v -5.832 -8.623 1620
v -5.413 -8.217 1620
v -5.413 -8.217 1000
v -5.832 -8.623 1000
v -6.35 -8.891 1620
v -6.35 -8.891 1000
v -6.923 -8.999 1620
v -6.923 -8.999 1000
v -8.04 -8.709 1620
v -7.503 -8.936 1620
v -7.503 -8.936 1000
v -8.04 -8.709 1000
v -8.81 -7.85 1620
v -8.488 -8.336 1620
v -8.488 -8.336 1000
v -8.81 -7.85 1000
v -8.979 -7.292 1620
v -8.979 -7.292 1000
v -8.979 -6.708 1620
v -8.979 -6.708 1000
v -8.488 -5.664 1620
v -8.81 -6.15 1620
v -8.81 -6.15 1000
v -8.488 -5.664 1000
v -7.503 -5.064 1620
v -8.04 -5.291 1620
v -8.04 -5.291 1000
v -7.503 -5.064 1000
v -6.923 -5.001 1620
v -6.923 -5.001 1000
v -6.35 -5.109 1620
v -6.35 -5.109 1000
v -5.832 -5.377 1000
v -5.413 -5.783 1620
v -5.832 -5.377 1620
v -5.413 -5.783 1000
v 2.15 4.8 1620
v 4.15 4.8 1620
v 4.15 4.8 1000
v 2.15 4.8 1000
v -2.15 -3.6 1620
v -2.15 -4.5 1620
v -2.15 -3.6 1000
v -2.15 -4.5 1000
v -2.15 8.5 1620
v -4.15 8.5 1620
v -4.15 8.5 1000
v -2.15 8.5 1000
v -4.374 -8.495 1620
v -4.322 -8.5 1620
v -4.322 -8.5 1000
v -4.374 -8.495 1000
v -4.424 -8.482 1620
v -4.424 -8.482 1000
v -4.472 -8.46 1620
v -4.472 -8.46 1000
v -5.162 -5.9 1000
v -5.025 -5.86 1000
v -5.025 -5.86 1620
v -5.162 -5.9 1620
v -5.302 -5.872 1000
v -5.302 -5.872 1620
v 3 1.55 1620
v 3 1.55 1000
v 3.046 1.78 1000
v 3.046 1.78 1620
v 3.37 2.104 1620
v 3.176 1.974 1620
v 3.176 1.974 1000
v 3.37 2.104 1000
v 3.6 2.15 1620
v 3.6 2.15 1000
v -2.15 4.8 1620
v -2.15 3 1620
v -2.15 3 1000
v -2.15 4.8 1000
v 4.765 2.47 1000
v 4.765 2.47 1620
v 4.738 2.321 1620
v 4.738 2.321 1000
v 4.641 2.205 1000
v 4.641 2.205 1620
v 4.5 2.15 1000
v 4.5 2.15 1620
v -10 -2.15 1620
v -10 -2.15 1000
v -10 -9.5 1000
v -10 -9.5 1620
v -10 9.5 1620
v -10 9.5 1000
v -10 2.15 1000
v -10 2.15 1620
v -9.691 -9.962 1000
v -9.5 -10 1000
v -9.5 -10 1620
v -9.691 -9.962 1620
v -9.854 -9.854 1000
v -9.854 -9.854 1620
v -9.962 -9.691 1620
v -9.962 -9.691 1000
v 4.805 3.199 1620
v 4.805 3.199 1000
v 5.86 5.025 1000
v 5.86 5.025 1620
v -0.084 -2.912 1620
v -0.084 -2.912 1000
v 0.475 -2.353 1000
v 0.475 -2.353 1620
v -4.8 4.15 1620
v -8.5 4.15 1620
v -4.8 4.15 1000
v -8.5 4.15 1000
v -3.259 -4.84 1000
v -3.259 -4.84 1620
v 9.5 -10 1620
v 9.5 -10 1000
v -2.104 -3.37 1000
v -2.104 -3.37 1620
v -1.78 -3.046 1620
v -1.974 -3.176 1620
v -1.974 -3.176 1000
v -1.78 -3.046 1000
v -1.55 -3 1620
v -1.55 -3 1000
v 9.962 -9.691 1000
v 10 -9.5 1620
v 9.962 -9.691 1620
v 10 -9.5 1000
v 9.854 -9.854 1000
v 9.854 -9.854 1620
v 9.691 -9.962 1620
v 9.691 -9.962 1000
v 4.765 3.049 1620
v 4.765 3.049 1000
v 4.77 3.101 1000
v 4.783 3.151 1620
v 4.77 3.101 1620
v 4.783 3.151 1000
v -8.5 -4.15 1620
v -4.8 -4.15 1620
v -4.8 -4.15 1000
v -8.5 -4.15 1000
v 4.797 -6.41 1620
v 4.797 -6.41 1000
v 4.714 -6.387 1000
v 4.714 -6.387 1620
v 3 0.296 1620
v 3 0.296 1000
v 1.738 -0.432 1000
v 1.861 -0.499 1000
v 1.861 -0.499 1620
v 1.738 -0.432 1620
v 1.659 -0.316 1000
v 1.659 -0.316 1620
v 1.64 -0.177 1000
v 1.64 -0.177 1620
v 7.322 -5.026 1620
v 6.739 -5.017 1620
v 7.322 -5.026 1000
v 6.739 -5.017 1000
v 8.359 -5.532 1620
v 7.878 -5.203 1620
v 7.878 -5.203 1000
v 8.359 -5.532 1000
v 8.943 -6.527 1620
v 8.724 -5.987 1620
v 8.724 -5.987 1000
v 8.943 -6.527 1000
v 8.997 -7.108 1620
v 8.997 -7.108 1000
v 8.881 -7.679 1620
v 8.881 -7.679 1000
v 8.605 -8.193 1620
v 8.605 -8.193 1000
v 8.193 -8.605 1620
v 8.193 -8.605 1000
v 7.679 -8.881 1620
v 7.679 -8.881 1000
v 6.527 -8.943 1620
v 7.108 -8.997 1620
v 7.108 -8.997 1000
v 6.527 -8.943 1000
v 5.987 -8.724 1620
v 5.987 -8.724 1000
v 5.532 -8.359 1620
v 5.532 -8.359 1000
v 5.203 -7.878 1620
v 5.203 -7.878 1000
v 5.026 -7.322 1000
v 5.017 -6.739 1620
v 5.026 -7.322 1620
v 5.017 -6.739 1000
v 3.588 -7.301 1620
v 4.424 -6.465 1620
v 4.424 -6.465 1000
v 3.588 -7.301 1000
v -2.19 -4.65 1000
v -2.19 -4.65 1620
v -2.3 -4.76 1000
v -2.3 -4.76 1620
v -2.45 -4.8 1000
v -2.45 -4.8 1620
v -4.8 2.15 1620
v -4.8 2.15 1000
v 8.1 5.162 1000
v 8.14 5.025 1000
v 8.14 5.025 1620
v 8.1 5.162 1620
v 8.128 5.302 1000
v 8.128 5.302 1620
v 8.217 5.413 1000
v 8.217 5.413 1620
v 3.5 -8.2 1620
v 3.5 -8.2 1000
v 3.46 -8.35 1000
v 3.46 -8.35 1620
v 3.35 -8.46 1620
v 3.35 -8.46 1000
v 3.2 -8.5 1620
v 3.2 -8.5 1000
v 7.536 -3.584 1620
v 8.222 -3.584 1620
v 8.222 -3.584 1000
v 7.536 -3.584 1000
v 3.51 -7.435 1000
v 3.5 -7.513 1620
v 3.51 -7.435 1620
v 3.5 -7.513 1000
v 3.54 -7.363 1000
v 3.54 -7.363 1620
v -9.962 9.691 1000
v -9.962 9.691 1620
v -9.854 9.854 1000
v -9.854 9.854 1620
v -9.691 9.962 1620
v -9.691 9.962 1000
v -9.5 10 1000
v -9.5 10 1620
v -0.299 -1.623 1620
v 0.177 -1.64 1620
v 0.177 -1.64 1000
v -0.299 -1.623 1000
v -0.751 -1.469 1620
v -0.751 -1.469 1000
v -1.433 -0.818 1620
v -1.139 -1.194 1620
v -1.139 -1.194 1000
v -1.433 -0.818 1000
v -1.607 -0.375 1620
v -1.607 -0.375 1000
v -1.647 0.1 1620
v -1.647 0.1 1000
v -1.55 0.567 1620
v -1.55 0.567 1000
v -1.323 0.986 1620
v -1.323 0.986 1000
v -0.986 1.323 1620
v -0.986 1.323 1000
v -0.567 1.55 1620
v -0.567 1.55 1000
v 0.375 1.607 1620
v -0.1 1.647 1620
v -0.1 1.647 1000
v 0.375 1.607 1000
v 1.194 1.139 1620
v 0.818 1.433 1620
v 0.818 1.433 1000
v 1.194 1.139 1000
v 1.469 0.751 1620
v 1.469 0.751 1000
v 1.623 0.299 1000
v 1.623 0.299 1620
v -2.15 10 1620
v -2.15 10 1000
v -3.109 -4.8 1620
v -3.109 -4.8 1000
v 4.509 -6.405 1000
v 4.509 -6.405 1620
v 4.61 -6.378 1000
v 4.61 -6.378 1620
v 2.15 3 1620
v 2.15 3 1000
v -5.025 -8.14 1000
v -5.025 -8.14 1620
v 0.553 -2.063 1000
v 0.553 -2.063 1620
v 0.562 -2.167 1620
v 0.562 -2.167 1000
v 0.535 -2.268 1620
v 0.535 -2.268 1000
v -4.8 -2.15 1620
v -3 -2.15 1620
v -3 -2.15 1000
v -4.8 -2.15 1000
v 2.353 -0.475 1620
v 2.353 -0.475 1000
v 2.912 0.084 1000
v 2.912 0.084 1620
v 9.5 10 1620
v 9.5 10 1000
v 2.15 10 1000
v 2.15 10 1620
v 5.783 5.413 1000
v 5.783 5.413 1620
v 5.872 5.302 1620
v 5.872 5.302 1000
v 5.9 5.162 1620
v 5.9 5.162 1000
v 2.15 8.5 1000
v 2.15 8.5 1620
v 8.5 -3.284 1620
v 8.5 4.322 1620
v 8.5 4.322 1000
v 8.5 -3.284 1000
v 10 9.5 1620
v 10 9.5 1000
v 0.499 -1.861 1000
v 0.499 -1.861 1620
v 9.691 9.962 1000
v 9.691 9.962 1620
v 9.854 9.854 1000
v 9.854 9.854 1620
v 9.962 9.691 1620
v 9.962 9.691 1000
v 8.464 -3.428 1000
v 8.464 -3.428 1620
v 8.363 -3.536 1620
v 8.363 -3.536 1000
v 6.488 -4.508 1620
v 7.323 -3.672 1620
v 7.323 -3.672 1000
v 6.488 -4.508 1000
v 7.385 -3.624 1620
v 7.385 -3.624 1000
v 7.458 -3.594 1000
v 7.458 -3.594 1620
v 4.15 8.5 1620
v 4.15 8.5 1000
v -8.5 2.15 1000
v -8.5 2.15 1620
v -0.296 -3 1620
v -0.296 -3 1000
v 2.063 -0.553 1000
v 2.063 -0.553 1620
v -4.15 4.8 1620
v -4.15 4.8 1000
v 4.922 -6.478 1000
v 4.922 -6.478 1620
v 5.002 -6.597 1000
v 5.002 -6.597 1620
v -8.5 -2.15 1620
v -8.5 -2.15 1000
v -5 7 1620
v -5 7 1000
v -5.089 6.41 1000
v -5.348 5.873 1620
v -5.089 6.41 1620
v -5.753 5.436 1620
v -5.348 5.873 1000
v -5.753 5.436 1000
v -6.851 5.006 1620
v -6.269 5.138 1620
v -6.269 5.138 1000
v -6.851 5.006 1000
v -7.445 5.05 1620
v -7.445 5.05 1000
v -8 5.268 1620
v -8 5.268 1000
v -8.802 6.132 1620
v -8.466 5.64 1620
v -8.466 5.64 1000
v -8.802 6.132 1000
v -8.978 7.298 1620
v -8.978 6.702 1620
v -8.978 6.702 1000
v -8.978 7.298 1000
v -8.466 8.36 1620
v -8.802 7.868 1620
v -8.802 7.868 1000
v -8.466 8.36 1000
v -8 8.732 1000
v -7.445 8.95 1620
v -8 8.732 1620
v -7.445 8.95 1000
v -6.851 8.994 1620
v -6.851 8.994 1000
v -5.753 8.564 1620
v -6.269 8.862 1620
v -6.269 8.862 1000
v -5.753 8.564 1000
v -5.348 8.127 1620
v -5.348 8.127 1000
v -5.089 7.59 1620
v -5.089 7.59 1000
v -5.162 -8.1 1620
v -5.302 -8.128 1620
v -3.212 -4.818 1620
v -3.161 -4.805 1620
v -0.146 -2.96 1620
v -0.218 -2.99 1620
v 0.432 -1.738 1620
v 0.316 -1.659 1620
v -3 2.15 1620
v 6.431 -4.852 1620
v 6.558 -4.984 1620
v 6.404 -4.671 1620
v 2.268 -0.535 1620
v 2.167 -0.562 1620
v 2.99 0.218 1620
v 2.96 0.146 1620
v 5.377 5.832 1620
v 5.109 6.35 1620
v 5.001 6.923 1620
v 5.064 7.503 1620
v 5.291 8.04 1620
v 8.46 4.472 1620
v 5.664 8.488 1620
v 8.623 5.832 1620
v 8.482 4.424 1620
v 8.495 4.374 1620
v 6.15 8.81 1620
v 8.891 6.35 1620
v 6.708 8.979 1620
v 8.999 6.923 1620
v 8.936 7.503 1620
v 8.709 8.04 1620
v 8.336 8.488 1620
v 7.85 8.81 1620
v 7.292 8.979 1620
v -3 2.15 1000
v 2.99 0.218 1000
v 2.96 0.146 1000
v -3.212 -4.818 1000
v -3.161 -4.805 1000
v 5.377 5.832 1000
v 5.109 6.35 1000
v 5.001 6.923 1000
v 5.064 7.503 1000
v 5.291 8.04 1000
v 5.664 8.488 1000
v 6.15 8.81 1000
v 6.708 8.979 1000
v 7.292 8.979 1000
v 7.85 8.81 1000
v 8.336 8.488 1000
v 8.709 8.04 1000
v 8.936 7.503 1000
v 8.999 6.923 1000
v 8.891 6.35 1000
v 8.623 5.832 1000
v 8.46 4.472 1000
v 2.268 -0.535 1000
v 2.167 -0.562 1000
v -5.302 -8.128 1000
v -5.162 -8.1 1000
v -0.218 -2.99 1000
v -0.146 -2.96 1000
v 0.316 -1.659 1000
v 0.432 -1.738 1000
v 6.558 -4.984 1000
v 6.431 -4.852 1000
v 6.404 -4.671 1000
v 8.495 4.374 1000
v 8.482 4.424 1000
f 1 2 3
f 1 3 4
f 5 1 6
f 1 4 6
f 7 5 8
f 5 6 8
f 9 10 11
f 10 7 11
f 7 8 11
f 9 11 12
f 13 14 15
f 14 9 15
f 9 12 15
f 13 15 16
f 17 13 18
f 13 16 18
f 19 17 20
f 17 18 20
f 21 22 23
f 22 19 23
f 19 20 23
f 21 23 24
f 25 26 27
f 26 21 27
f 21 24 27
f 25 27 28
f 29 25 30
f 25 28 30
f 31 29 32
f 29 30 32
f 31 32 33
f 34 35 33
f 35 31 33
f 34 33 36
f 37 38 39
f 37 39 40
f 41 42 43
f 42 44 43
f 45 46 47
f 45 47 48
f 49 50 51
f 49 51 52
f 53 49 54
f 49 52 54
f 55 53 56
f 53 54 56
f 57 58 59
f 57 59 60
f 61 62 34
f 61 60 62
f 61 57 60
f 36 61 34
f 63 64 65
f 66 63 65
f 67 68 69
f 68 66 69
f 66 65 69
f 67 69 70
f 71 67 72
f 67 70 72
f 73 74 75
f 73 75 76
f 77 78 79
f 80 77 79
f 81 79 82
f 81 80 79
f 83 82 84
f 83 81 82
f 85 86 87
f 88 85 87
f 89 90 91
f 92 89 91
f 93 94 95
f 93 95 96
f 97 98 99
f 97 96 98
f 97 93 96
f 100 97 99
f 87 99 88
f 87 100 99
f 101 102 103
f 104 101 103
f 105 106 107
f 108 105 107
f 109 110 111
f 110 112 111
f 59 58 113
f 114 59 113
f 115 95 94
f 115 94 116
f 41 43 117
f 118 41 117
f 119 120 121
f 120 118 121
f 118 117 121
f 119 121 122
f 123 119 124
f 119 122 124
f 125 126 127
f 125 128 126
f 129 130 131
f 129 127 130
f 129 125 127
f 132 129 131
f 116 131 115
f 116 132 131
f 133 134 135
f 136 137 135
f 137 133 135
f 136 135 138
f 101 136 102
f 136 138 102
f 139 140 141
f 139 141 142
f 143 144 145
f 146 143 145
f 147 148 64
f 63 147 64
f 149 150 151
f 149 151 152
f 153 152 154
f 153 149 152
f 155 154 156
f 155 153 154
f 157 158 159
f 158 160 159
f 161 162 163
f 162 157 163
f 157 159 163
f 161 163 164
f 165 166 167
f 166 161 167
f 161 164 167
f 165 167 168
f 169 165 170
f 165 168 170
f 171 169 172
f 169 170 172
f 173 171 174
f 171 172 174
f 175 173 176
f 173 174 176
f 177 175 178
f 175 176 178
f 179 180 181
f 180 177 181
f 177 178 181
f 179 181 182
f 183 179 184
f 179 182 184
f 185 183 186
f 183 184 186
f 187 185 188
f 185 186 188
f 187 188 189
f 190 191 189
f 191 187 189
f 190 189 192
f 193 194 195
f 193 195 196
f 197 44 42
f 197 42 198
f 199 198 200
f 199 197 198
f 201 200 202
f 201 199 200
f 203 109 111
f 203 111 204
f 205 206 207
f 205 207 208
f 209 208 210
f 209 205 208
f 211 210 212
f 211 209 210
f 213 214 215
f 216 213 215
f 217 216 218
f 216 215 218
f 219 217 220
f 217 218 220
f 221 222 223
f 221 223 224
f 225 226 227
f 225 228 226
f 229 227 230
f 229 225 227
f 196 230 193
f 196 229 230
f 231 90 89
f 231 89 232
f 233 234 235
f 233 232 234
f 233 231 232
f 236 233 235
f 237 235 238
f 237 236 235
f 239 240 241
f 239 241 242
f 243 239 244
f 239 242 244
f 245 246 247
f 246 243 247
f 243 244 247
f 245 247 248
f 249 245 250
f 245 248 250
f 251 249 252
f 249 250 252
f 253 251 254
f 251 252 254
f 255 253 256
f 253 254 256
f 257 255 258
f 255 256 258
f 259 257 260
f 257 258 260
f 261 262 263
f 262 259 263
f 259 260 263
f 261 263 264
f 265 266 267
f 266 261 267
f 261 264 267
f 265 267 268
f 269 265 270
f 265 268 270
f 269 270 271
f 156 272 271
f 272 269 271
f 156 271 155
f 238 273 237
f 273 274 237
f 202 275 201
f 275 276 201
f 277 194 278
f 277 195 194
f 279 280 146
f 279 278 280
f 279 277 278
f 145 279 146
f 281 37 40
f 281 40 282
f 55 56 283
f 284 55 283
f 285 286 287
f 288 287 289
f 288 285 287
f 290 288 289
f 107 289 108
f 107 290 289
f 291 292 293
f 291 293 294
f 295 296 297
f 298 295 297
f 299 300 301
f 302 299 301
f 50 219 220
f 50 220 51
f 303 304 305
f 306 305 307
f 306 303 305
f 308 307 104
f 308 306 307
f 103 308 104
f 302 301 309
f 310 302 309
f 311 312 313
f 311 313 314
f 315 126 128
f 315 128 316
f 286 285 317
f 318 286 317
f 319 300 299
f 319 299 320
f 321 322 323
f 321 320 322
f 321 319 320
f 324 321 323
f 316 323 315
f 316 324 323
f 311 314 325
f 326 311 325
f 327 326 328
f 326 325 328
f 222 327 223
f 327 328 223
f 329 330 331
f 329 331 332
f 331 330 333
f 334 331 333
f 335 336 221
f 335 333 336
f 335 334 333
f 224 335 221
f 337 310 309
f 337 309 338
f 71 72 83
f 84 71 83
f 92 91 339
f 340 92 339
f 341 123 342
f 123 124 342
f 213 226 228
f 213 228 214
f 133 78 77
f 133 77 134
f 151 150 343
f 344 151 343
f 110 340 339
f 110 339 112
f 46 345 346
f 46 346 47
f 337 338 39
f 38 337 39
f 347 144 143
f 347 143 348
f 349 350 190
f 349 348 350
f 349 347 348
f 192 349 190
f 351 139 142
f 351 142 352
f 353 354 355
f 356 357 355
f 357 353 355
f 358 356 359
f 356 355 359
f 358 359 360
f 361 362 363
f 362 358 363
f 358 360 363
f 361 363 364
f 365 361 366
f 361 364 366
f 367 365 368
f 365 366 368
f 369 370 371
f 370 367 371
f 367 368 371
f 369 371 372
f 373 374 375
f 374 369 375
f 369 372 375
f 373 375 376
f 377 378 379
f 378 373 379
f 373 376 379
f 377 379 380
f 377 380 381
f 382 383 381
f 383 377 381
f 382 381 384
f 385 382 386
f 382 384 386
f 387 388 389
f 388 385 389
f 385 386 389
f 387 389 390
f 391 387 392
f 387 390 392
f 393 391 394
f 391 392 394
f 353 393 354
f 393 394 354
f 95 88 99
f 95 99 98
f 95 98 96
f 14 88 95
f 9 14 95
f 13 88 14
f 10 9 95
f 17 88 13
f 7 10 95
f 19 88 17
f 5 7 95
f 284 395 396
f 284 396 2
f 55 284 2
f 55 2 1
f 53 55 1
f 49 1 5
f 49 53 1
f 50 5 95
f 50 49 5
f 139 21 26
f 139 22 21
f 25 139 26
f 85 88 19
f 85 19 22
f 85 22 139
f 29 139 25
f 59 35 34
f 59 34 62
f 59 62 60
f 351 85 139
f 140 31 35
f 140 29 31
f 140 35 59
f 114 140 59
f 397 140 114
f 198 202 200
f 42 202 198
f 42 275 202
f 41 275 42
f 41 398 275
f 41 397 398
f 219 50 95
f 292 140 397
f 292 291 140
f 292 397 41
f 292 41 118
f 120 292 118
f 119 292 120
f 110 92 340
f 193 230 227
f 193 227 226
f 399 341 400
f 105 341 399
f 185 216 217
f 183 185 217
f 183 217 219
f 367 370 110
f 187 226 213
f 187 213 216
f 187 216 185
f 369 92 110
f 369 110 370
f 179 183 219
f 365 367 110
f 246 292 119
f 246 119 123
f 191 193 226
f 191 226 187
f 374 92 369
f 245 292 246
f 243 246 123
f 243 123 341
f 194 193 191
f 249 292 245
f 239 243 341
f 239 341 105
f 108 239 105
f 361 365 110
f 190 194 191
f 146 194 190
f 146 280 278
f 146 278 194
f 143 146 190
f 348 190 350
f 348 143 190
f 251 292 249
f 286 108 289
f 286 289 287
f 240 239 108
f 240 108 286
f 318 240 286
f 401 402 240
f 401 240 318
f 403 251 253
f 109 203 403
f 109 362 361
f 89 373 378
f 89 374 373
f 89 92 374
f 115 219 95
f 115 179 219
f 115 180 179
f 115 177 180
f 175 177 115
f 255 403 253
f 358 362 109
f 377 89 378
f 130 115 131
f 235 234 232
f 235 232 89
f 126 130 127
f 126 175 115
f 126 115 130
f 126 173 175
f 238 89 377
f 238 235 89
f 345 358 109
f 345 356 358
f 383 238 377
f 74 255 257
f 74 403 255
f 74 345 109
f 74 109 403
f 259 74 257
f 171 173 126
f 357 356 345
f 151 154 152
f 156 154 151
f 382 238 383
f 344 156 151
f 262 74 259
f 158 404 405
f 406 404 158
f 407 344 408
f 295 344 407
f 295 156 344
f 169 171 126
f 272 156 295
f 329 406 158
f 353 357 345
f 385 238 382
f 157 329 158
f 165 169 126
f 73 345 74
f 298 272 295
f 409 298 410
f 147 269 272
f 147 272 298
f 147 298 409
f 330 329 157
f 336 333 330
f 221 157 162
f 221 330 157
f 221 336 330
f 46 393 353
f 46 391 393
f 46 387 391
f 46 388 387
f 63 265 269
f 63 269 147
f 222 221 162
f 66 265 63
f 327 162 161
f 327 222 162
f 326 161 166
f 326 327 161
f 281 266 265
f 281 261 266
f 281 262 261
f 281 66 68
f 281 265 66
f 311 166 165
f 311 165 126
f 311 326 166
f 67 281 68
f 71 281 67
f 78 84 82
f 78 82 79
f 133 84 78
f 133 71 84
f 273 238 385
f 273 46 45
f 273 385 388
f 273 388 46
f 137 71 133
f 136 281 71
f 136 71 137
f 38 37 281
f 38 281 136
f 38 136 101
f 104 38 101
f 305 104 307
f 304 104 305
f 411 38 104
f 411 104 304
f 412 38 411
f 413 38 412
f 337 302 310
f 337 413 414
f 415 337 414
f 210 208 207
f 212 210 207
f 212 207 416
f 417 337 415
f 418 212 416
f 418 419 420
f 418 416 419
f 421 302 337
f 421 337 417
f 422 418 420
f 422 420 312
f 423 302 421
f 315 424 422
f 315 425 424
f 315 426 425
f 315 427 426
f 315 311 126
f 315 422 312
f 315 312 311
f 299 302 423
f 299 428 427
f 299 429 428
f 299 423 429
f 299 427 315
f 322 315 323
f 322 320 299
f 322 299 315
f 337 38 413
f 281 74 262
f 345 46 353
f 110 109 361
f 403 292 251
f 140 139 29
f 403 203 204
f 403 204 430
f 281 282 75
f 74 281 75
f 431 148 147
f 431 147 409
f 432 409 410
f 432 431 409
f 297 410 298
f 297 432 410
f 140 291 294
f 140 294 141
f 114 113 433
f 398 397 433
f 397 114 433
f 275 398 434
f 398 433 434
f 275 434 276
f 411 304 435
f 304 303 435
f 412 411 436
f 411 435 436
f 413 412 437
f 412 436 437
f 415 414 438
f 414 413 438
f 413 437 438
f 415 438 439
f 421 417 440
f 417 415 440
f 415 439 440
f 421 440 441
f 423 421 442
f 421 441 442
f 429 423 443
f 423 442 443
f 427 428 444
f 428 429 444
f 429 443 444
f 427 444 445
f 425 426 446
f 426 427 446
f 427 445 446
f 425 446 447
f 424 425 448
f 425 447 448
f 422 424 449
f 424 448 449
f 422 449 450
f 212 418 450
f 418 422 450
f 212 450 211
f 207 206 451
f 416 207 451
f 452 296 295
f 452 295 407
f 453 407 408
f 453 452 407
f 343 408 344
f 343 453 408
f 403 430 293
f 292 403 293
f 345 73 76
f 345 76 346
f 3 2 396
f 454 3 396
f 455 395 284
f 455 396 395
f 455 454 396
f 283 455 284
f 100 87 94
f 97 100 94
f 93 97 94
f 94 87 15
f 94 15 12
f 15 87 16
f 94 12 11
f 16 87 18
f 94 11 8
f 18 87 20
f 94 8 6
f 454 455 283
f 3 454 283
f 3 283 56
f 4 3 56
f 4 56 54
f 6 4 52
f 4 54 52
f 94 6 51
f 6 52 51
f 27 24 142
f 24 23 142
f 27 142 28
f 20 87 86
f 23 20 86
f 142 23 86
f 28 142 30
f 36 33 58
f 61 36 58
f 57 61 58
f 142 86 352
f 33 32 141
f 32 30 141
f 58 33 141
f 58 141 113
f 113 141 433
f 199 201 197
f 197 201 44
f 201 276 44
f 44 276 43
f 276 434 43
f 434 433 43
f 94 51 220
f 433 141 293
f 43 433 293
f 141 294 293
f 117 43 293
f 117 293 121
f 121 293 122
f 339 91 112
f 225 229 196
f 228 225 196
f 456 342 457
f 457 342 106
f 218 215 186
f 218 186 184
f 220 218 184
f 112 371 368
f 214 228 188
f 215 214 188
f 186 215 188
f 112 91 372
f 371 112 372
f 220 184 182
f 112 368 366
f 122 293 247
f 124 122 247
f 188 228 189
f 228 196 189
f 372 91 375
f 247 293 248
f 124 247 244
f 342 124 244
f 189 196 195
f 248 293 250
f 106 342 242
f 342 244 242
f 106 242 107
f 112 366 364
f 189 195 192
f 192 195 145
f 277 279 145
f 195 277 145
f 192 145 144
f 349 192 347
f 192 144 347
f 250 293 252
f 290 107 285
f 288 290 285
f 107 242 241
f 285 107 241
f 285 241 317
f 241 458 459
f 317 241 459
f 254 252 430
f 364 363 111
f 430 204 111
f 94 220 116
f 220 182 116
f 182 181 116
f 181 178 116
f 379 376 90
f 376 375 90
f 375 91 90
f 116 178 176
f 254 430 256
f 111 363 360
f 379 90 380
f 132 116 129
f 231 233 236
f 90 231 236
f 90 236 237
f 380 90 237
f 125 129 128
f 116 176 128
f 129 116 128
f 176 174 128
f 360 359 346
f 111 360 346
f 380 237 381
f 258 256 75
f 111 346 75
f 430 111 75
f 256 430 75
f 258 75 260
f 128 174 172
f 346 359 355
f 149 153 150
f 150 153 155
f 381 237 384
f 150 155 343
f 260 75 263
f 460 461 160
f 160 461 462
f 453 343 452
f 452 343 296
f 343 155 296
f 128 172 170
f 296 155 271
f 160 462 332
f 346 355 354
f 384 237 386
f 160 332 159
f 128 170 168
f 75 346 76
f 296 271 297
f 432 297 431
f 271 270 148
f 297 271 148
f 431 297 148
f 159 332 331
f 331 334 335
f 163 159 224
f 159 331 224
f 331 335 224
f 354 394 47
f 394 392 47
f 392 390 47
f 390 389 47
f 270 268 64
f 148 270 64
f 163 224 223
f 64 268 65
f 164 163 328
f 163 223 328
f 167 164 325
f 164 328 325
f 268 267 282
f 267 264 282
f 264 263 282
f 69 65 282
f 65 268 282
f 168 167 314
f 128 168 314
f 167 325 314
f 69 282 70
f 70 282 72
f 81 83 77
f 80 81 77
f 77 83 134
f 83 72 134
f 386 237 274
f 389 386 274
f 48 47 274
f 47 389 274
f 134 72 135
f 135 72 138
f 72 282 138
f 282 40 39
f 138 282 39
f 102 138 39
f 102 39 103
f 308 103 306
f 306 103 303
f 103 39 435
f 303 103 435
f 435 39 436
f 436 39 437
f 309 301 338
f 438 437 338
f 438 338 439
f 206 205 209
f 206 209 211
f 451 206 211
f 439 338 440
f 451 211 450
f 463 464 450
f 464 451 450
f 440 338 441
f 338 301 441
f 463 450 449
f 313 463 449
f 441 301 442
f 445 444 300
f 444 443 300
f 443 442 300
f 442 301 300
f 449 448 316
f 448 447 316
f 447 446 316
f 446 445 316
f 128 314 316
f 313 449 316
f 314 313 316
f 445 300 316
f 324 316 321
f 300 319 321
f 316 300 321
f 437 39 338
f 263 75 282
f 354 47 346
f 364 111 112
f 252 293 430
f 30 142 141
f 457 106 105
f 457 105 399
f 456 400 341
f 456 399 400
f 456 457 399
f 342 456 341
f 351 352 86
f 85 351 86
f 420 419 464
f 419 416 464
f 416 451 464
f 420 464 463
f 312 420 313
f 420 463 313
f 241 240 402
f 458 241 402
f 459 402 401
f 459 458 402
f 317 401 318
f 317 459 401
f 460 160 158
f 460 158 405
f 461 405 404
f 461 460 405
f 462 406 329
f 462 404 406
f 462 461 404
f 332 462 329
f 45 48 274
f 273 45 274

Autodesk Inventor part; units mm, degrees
ref_plane "YZ Plane" through (0, 0, 0) normal (1, 0, 0) x (0, 1, 0)
ref_plane "XZ Plane" through (0, 0, 0) normal (0, 1, 0) x (-1, 0, 0)
ref_plane "作業平面1" through (-9.5, -10, 1000) normal (0, 0, 1) x (1, 0, 0)
sketch "スケッチ1" plane through (-9.5, -10, 1000) normal (0, 0, 1) x (1, 0, 0)
  line L0 (7.35, 18.5) -> (7.35, 20) projected
  line L1 (7.35, 20) -> (0, 20) projected
  arc A0 (0, 20) -> (-0.5, 19.5) centre (0, 19.5) ccw projected
  line L2 (-0.5, 19.5) -> (-0.5, 12.15) projected
  line L3 (-0.5, 12.15) -> (1, 12.15) projected
  line L4 (1, 12.15) -> (1, 14.15) projected
  line L5 (1, 14.15) -> (4.7, 14.15) projected
  line L6 (4.7, 14.15) -> (4.7, 12.15) projected
  line L7 (4.7, 12.15) -> (6.5, 12.15) projected
  line L8 (6.5, 12.15) -> (6.5, 7.85) projected
  line L9 (6.5, 7.85) -> (4.7, 7.85) projected
  line L10 (4.7, 7.85) -> (4.7, 5.85) projected
  line L11 (4.7, 5.85) -> (1, 5.85) projected
  line L12 (1, 5.85) -> (1, 7.85) projected
  line L13 (1, 7.85) -> (-0.5, 7.85) projected
  line L14 (-0.5, 7.85) -> (-0.5, 0.5) projected
  arc A1 (-0.5, 0.5) -> (0, 0) centre (0, 0.5) ccw projected
  line L15 (0, 0) -> (19, 0) projected
  arc A2 (19, 0) -> (19.5, 0.5) centre (19, 0.5) ccw projected
  line L16 (19.5, 0.5) -> (19.5, 19.5) projected
  arc A3 (19.5, 19.5) -> (19, 20) centre (19, 19.5) ccw projected
  line L17 (19, 20) -> (11.65, 20) projected
  line L18 (11.65, 20) -> (11.65, 18.5) projected
  line L19 (11.65, 18.5) -> (13.65, 18.5) projected
  line L20 (13.65, 18.5) -> (13.65, 14.8) projected
  line L21 (13.65, 14.8) -> (11.65, 14.8) projected
  line L22 (11.65, 14.8) -> (11.65, 13) projected
  line L23 (11.65, 13) -> (7.35, 13) projected
  line L24 (7.35, 13) -> (7.35, 14.8) projected
  line L25 (7.35, 14.8) -> (5.35, 14.8) projected
  line L26 (5.35, 14.8) -> (5.35, 18.5) projected
  line L27 (5.35, 18.5) -> (7.35, 18.5) projected
  arc A4 (17.7174, 15.4132) -> (17.6402, 15.0252) centre (17.9, 15.1752) ccw projected
  line L28 (17.6402, 15.0252) -> (17.9598, 14.4715) projected
  arc A5 (18, 14.3215) -> (17.9598, 14.4715) centre (17.7, 14.3215) ccw projected
  line L29 (18, 14.3215) -> (18, 6.7162) projected
  arc A6 (17.7225, 6.4162) -> (18, 6.7162) centre (17.7, 6.7153) ccw projected
  line L30 (17.7225, 6.4162) -> (17.0355, 6.4162) projected
  arc A7 (17.0355, 6.4162) -> (16.8233, 6.3283) centre (17.0355, 6.1162) ccw projected
  line L31 (16.8233, 6.3283) -> (15.9875, 5.4924) projected
  arc A8 (15.9875, 5.4924) -> (16.2388, 4.9829) centre (16.1996, 5.2803) ccw projected
  arc A9 (14.5171, 3.2612) -> (16.2388, 4.9829) centre (16.5, 3) ccw projected
  arc A10 (14.5171, 3.2612) -> (14.2973, 3.5902) centre (14.2197, 3.3004) ccw projected
  line L32 (14.2973, 3.5902) -> (14.2135, 3.6127) projected
  arc A11 (14.2135, 3.6127) -> (13.9237, 3.535) centre (14.1359, 3.3229) ccw projected
  line L33 (13.9237, 3.535) -> (13.0879, 2.6991) projected
  arc A12 (13.0879, 2.6991) -> (13, 2.487) centre (13.3, 2.487) ccw projected
  line L34 (13, 2.487) -> (13, 1.8) projected
  arc A13 (12.7, 1.5) -> (13, 1.8) centre (12.7, 1.8) ccw projected
  line L35 (12.7, 1.5) -> (5.1785, 1.5) projected
  arc A14 (5.0285, 1.5402) -> (5.1785, 1.5) centre (5.1785, 1.8) ccw projected
  line L36 (5.0285, 1.5402) -> (4.4748, 1.8598) projected
  arc A15 (4.4748, 1.8598) -> (4.0868, 1.7826) centre (4.3248, 1.6) ccw projected
  arc A16 (4.0868, 4.2174) -> (4.0868, 1.7826) centre (2.5, 3) ccw projected
  arc A17 (4.0868, 4.2174) -> (4.4748, 4.1402) centre (4.3248, 4.4) ccw projected
  line L37 (4.4748, 4.1402) -> (6.2409, 5.1598) projected
  arc A18 (6.3909, 5.2) -> (6.2409, 5.1598) centre (6.3909, 4.9) ccw projected
  line L38 (6.3909, 5.2) -> (7.05, 5.2) projected
  arc A19 (7.05, 5.2) -> (7.35, 5.5) centre (7.05, 5.5) ccw projected
  line L39 (7.35, 5.5) -> (7.35, 6.4) projected
  arc A20 (7.95, 7) -> (7.35, 6.4) centre (7.95, 6.4) ccw projected
  line L40 (7.95, 7) -> (9.2042, 7) projected
  arc A21 (9.2042, 7) -> (9.4163, 7.0879) centre (9.2042, 7.3) ccw projected
  line L41 (9.4163, 7.0879) -> (9.9752, 7.6468) projected
  arc A22 (9.9752, 7.6468) -> (10.0529, 7.9366) centre (9.7631, 7.8589) ccw projected
  line L42 (10.0529, 7.9366) -> (9.9987, 8.1389) projected
  arc A23 (9.9987, 8.1389) -> (9.6768, 8.3595) centre (9.7089, 8.0612) ccw projected
  arc A24 (11.1405, 9.8232) -> (9.6768, 8.3595) centre (9.5, 10) ccw projected
  arc A25 (11.1405, 9.8232) -> (11.3611, 9.5013) centre (11.4388, 9.7911) ccw projected
  line L43 (11.3611, 9.5013) -> (11.5634, 9.4471) projected
  arc A26 (11.5634, 9.4471) -> (11.8532, 9.5248) centre (11.6411, 9.7369) ccw projected
  line L44 (11.8532, 9.5248) -> (12.4121, 10.0837) projected
  arc A27 (12.4121, 10.0837) -> (12.5, 10.2958) centre (12.2, 10.2958) ccw projected
  line L45 (12.5, 10.2958) -> (12.5, 11.55) projected
  arc A28 (13.1, 12.15) -> (12.5, 11.55) centre (13.1, 11.55) ccw projected
  line L46 (13.1, 12.15) -> (14, 12.15) projected
  arc A29 (14, 12.15) -> (14.2652, 12.4701) centre (13.966, 12.4481) ccw projected
  line L47 (14.2652, 12.4701) -> (14.2652, 13.0488) projected
  arc A30 (14.3054, 13.1988) -> (14.2652, 13.0488) centre (14.5652, 13.0488) ccw projected
  line L48 (14.3054, 13.1988) -> (15.3598, 15.0252) projected
  arc A31 (15.3598, 15.0252) -> (15.2826, 15.4132) centre (15.1, 15.1752) ccw projected
  arc A32 (17.7174, 15.4132) -> (15.2826, 15.4132) centre (16.5, 17) ccw projected
  circle A33 centre (2.5, 17) radius 2 projected
  point P0 (9.5, 10)
extrude "押し出し1" add sketch "スケッチ1" along normal blind 620
properties part number "AFST-2020-4-1000"
